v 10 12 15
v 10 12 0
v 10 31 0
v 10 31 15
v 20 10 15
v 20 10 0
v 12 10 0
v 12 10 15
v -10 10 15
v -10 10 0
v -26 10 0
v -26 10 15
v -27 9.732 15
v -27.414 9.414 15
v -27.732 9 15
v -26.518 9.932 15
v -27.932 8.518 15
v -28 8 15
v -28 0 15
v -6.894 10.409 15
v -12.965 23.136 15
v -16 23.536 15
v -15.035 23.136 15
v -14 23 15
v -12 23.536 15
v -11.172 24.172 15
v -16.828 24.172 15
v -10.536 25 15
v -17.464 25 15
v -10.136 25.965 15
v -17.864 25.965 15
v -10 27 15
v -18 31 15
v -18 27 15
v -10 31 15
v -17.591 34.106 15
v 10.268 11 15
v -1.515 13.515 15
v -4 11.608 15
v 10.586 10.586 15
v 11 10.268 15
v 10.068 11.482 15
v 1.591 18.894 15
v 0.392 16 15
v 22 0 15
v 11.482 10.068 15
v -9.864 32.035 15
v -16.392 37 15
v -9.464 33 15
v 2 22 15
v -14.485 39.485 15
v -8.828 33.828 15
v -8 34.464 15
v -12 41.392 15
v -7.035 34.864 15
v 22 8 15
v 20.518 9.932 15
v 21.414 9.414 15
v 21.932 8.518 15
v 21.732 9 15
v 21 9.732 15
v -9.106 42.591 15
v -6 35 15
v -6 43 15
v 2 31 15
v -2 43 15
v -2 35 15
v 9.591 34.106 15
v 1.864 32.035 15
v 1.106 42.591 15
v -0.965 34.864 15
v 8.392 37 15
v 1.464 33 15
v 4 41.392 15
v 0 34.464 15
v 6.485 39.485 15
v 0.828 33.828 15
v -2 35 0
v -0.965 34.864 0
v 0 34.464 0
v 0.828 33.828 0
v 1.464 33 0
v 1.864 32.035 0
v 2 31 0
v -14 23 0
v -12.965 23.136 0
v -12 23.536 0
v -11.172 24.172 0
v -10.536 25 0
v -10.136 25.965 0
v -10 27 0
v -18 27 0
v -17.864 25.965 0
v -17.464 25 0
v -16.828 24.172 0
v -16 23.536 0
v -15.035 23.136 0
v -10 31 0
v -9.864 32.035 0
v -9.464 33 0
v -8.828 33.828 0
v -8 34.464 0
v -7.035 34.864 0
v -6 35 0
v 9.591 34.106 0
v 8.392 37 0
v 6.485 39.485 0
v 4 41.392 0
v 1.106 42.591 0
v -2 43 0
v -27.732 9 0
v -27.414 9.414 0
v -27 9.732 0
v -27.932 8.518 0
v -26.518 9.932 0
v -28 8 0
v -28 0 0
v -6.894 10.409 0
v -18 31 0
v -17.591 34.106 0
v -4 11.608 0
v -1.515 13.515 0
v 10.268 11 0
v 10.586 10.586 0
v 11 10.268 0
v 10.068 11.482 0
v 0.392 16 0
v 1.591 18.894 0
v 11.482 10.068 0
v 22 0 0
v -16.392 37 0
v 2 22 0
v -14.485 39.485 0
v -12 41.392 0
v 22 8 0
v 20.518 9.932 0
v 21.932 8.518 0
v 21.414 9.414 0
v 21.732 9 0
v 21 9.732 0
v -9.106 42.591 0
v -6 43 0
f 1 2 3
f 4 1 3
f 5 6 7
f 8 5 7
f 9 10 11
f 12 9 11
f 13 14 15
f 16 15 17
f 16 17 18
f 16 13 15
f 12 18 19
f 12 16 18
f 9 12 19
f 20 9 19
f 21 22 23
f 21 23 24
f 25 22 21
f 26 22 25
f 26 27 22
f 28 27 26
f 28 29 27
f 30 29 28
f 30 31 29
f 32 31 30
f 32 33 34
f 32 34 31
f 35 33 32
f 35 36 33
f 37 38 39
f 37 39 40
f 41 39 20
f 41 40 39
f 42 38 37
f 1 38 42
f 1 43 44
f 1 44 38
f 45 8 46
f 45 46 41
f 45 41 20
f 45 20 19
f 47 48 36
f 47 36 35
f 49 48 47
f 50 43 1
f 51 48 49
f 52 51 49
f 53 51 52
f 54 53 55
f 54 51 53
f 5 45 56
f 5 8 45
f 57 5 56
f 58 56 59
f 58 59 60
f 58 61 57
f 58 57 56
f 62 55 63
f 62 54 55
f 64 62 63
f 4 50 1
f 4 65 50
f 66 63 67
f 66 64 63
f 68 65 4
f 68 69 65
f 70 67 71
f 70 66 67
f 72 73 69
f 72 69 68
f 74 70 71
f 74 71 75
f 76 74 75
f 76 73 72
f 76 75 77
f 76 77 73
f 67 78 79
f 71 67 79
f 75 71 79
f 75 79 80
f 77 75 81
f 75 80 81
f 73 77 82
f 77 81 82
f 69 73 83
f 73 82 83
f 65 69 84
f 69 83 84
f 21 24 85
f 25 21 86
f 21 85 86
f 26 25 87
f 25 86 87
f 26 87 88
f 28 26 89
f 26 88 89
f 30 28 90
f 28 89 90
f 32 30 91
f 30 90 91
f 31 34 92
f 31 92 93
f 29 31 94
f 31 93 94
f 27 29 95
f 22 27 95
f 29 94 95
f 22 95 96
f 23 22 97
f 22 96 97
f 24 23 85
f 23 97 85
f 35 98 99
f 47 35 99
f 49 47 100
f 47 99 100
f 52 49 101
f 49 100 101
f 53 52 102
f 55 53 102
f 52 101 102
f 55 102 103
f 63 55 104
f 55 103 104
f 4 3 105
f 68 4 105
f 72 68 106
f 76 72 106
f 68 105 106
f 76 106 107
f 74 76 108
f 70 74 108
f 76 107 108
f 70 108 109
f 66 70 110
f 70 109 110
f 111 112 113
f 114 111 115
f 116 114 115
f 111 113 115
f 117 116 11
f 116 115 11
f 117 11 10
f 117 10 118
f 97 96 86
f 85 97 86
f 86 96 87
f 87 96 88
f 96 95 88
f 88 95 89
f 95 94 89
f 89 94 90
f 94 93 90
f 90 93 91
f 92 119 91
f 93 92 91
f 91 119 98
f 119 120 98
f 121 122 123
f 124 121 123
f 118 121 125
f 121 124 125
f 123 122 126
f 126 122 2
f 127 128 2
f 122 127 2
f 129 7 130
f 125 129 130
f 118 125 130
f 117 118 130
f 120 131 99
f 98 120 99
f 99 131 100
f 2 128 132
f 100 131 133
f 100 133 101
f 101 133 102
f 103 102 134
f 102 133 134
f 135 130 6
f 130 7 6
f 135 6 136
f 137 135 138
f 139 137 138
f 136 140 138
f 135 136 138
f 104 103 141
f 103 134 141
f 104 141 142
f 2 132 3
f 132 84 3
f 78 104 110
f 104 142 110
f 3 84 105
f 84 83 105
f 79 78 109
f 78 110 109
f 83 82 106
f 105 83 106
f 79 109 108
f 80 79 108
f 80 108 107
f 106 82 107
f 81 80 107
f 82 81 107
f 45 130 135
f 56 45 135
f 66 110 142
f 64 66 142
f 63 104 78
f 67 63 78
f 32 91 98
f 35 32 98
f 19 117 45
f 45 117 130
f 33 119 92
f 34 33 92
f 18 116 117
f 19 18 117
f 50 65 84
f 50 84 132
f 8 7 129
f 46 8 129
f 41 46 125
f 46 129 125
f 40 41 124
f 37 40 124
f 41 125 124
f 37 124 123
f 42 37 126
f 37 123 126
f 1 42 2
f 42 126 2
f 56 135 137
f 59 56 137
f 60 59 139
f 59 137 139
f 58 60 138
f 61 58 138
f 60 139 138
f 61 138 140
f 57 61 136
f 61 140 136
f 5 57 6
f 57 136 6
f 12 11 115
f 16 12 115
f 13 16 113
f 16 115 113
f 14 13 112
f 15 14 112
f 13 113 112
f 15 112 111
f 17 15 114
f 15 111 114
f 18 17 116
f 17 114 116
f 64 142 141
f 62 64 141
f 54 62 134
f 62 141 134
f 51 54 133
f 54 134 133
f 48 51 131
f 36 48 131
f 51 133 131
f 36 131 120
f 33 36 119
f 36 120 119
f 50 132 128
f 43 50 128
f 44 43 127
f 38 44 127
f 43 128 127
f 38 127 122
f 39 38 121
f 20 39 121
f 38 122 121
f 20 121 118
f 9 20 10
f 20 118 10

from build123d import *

# Parameters (mm, degrees)
F1_DEPTH = 15


with BuildPart() as f1:
    # F0 (on Top) → F1 (new body)
    with BuildSketch(Plane.XY):
        with BuildLine():
            Line((-28, 8), (-28, 0))
            Line((-28, 0), (22, 0))
            Line((22, 0), (22, 8))
            ThreePointArc((22, 8), (21.414214, 9.414214), (20, 10))
            Line((20, 10), (12, 10))
            ThreePointArc((12, 10), (10.585786, 10.585786), (10, 12))
            Line((10, 12), (10, 31))
            ThreePointArc((10, 31), (6.485281, 39.485281), (-2, 43))
            Line((-2, 43), (-3.051823, 43))
            Line((-3.051823, 43), (-6, 43))
            ThreePointArc((-6, 43), (-14.485281, 39.485281), (-18, 31))
            Line((-18, 31), (-18, 27))
            ThreePointArc((-18, 27), (-16.828427, 24.171573), (-14, 23))
            ThreePointArc((-14, 23), (-11.171573, 24.171573), (-10, 27))
            Line((-10, 27), (-10, 31))
            ThreePointArc((-10, 31), (-8.828427, 33.828427), (-6, 35))
            Line((-6, 35), (-2, 35))
            ThreePointArc((-2, 35), (0.828427, 33.828427), (2, 31))
            Line((2, 31), (2, 22))
            ThreePointArc((2, 22), (-1.514719, 13.514719), (-10, 10))
            Line((-10, 10), (-26, 10))
            ThreePointArc((-26, 10), (-27.414214, 9.414214), (-28, 8))
        make_face()
    extrude(amount=F1_DEPTH)


solid = f1.part
